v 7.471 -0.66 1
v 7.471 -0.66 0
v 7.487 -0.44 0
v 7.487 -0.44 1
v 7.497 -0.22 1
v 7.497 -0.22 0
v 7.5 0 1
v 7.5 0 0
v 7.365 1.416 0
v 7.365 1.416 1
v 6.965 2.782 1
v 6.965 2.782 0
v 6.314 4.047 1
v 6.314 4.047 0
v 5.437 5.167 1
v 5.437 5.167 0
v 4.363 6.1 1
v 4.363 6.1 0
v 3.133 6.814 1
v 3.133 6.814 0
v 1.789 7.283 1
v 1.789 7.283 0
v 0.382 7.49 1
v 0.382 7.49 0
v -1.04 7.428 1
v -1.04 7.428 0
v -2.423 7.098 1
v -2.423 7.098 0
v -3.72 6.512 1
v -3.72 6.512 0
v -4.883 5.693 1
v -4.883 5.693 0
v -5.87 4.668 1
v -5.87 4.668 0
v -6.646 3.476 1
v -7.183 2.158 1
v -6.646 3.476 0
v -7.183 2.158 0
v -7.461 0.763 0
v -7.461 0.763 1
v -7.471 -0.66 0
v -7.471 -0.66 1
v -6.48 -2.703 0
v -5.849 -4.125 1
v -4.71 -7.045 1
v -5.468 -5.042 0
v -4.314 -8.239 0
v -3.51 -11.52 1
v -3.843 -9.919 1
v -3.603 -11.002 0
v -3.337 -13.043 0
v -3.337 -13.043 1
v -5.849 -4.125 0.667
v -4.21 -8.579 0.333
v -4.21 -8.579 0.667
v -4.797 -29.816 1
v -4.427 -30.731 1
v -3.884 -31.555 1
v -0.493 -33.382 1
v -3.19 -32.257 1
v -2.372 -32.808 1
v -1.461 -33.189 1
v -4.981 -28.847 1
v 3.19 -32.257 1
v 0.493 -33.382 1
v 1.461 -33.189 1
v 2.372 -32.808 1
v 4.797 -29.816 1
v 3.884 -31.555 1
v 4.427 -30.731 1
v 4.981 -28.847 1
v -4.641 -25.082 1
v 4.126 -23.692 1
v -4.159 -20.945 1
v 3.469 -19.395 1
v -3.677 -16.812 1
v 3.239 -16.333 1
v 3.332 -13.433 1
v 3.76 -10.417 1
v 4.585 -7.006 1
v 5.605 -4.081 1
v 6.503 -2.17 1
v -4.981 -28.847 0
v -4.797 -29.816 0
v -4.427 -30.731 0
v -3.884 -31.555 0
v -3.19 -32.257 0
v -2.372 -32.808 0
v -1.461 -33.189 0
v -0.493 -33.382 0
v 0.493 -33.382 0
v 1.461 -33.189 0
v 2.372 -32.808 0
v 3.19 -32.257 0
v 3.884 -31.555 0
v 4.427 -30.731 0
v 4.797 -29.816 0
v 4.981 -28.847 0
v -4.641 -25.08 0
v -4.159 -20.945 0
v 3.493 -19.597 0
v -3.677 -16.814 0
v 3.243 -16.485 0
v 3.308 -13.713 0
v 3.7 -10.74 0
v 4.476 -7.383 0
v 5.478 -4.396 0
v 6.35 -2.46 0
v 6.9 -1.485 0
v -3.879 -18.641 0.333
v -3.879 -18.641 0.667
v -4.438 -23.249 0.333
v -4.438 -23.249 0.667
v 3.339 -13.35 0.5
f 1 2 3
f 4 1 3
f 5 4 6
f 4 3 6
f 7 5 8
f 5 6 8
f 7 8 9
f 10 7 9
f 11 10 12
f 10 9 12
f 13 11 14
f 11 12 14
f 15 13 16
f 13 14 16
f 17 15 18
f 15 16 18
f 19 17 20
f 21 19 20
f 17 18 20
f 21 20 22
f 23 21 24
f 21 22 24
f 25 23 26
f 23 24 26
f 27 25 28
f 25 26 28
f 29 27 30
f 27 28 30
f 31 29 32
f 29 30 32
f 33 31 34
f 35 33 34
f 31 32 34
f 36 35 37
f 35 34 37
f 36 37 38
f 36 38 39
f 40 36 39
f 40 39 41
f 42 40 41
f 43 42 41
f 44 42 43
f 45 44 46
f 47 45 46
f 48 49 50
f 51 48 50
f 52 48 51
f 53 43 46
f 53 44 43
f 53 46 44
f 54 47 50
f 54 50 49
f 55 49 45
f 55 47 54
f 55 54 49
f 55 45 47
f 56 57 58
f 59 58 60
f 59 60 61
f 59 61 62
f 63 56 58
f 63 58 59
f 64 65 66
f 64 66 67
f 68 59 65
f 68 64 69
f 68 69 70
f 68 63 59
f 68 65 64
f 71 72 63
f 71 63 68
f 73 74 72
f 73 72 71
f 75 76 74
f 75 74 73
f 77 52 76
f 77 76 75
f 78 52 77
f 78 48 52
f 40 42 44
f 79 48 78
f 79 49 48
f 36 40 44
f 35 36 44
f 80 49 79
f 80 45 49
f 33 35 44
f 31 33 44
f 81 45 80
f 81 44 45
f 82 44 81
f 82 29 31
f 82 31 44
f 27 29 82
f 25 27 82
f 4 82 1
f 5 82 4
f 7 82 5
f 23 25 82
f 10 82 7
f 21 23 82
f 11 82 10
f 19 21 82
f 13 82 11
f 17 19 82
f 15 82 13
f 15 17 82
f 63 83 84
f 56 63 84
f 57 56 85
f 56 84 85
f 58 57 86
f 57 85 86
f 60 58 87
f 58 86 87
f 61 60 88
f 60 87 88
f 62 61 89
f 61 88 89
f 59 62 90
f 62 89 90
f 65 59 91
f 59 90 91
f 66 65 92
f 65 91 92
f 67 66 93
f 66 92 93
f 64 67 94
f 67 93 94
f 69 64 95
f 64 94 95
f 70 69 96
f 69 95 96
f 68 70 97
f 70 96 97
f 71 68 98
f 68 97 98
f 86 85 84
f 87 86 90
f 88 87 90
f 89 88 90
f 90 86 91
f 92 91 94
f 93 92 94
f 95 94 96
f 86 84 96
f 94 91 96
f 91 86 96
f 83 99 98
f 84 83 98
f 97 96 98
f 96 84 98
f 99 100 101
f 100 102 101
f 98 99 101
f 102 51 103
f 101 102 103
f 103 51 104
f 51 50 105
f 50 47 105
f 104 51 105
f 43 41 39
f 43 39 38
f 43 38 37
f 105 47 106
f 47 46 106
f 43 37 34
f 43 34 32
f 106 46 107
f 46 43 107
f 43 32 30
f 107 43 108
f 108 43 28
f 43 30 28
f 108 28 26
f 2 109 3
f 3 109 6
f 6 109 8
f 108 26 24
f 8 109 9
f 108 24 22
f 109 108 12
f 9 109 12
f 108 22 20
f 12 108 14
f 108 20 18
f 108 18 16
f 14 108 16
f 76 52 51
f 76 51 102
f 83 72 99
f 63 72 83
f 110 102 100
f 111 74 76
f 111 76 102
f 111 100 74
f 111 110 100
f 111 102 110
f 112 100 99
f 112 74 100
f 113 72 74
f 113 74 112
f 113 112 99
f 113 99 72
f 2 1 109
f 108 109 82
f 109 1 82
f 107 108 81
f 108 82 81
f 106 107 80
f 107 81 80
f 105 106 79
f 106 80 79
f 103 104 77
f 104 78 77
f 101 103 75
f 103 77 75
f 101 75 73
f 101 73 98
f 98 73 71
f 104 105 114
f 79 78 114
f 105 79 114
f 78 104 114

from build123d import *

# Parameters (mm, degrees)
F1_DEPTH = 1
F3_DEPTH = 1.001


with BuildPart() as f1:
    # F0 (on Top) → F1 (new body)
    with BuildSketch(Plane.XY):
        with BuildLine():
            ThreePointArc((7.4708988489, -0.6600533237), (7.4927211801, -0.3303472669), (7.5, 0))
            ThreePointArc((7.5, 0), (-0.3303472669, 7.4927211801), (-7.4708988489, -0.6600533237))
            ThreePointArc((-7.4708988489, -0.6600533237), (0, -7.5), (7.4708988489, -0.6600533237))
        make_face()
        with BuildLine():
            ThreePointArc((7.4708988489, -0.6600533237), (0, -7.5), (-7.4708988489, -0.6600533237))
            Line((-7.4708988489, -0.6600533237), (-4.9805992326, -28.8468313747))
            ThreePointArc((-4.9805992326, -28.8468313747), (-0.2202315113, -23.4116483722), (5, -28.4067958256))
            ThreePointArc((5, -28.4067958256), (4.9951474534, -28.6270273369), (4.9805992326, -28.8468313747))
            Line((4.9805992326, -28.8468313747), (7.4708988489, -0.6600533237))
        make_face()
        with BuildLine():
            ThreePointArc((5, -28.4067958256), (-0.2202315113, -23.4116483722), (-4.9805992326, -28.8468313747))
            ThreePointArc((-4.9805992326, -28.8468313747), (0, -33.4067958256), (4.9805992326, -28.8468313747))
            ThreePointArc((4.9805992326, -28.8468313747), (4.9951474534, -28.6270273369), (5, -28.4067958256))
        make_face()
    extrude(amount=F1_DEPTH)

    # F2 (on face) → F3 (cut, through all)
    with BuildSketch(Plane.XY.offset(1)):
        with BuildLine():
            Line((4.9805992326, -28.8468313747), (7.4708988489, -0.6600533237))
            add(Edge.make_bspline(
                [(7.4708988489, -0.6600533237), (5.498580859, -3.1850634696), (1.8864989838, -14.7813510423), (3.9574673082, -22.1269366386), (4.9805992326, -28.8468313747)],
                knots=[0, 0, 0, 0, 0.4806365809, 1, 1, 1, 1], degree=3))
        make_face()
        with BuildLine():
            add(Edge.make_bspline(
                [(-7.4708988489, -0.6600533237), (-6.1183570617, -3.3043206109), (-3.5667393822, -8.8997869752), (-3.3365392592, -13.0433700979)],
                knots=[0, 0, 0, 0, 13.0552465908, 13.0552465908, 13.0552465908, 13.0552465908], degree=3))
            Line((-7.4708988489, -0.6600533237), (-4.9805992326, -28.8468313747))
            add(Edge.make_bspline(
                [(-3.3365392592, -13.0433700979), (-3.8589811743, -19.7946954944), (-4.4581573175, -22.0955059782), (-4.9805992326, -28.8468313747)],
                knots=[0, 0, 0, 0, 15.888748268, 15.888748268, 15.888748268, 15.888748268], degree=3))
        make_face()
    extrude(amount=-F3_DEPTH, mode=Mode.SUBTRACT)


solid = f1.part
